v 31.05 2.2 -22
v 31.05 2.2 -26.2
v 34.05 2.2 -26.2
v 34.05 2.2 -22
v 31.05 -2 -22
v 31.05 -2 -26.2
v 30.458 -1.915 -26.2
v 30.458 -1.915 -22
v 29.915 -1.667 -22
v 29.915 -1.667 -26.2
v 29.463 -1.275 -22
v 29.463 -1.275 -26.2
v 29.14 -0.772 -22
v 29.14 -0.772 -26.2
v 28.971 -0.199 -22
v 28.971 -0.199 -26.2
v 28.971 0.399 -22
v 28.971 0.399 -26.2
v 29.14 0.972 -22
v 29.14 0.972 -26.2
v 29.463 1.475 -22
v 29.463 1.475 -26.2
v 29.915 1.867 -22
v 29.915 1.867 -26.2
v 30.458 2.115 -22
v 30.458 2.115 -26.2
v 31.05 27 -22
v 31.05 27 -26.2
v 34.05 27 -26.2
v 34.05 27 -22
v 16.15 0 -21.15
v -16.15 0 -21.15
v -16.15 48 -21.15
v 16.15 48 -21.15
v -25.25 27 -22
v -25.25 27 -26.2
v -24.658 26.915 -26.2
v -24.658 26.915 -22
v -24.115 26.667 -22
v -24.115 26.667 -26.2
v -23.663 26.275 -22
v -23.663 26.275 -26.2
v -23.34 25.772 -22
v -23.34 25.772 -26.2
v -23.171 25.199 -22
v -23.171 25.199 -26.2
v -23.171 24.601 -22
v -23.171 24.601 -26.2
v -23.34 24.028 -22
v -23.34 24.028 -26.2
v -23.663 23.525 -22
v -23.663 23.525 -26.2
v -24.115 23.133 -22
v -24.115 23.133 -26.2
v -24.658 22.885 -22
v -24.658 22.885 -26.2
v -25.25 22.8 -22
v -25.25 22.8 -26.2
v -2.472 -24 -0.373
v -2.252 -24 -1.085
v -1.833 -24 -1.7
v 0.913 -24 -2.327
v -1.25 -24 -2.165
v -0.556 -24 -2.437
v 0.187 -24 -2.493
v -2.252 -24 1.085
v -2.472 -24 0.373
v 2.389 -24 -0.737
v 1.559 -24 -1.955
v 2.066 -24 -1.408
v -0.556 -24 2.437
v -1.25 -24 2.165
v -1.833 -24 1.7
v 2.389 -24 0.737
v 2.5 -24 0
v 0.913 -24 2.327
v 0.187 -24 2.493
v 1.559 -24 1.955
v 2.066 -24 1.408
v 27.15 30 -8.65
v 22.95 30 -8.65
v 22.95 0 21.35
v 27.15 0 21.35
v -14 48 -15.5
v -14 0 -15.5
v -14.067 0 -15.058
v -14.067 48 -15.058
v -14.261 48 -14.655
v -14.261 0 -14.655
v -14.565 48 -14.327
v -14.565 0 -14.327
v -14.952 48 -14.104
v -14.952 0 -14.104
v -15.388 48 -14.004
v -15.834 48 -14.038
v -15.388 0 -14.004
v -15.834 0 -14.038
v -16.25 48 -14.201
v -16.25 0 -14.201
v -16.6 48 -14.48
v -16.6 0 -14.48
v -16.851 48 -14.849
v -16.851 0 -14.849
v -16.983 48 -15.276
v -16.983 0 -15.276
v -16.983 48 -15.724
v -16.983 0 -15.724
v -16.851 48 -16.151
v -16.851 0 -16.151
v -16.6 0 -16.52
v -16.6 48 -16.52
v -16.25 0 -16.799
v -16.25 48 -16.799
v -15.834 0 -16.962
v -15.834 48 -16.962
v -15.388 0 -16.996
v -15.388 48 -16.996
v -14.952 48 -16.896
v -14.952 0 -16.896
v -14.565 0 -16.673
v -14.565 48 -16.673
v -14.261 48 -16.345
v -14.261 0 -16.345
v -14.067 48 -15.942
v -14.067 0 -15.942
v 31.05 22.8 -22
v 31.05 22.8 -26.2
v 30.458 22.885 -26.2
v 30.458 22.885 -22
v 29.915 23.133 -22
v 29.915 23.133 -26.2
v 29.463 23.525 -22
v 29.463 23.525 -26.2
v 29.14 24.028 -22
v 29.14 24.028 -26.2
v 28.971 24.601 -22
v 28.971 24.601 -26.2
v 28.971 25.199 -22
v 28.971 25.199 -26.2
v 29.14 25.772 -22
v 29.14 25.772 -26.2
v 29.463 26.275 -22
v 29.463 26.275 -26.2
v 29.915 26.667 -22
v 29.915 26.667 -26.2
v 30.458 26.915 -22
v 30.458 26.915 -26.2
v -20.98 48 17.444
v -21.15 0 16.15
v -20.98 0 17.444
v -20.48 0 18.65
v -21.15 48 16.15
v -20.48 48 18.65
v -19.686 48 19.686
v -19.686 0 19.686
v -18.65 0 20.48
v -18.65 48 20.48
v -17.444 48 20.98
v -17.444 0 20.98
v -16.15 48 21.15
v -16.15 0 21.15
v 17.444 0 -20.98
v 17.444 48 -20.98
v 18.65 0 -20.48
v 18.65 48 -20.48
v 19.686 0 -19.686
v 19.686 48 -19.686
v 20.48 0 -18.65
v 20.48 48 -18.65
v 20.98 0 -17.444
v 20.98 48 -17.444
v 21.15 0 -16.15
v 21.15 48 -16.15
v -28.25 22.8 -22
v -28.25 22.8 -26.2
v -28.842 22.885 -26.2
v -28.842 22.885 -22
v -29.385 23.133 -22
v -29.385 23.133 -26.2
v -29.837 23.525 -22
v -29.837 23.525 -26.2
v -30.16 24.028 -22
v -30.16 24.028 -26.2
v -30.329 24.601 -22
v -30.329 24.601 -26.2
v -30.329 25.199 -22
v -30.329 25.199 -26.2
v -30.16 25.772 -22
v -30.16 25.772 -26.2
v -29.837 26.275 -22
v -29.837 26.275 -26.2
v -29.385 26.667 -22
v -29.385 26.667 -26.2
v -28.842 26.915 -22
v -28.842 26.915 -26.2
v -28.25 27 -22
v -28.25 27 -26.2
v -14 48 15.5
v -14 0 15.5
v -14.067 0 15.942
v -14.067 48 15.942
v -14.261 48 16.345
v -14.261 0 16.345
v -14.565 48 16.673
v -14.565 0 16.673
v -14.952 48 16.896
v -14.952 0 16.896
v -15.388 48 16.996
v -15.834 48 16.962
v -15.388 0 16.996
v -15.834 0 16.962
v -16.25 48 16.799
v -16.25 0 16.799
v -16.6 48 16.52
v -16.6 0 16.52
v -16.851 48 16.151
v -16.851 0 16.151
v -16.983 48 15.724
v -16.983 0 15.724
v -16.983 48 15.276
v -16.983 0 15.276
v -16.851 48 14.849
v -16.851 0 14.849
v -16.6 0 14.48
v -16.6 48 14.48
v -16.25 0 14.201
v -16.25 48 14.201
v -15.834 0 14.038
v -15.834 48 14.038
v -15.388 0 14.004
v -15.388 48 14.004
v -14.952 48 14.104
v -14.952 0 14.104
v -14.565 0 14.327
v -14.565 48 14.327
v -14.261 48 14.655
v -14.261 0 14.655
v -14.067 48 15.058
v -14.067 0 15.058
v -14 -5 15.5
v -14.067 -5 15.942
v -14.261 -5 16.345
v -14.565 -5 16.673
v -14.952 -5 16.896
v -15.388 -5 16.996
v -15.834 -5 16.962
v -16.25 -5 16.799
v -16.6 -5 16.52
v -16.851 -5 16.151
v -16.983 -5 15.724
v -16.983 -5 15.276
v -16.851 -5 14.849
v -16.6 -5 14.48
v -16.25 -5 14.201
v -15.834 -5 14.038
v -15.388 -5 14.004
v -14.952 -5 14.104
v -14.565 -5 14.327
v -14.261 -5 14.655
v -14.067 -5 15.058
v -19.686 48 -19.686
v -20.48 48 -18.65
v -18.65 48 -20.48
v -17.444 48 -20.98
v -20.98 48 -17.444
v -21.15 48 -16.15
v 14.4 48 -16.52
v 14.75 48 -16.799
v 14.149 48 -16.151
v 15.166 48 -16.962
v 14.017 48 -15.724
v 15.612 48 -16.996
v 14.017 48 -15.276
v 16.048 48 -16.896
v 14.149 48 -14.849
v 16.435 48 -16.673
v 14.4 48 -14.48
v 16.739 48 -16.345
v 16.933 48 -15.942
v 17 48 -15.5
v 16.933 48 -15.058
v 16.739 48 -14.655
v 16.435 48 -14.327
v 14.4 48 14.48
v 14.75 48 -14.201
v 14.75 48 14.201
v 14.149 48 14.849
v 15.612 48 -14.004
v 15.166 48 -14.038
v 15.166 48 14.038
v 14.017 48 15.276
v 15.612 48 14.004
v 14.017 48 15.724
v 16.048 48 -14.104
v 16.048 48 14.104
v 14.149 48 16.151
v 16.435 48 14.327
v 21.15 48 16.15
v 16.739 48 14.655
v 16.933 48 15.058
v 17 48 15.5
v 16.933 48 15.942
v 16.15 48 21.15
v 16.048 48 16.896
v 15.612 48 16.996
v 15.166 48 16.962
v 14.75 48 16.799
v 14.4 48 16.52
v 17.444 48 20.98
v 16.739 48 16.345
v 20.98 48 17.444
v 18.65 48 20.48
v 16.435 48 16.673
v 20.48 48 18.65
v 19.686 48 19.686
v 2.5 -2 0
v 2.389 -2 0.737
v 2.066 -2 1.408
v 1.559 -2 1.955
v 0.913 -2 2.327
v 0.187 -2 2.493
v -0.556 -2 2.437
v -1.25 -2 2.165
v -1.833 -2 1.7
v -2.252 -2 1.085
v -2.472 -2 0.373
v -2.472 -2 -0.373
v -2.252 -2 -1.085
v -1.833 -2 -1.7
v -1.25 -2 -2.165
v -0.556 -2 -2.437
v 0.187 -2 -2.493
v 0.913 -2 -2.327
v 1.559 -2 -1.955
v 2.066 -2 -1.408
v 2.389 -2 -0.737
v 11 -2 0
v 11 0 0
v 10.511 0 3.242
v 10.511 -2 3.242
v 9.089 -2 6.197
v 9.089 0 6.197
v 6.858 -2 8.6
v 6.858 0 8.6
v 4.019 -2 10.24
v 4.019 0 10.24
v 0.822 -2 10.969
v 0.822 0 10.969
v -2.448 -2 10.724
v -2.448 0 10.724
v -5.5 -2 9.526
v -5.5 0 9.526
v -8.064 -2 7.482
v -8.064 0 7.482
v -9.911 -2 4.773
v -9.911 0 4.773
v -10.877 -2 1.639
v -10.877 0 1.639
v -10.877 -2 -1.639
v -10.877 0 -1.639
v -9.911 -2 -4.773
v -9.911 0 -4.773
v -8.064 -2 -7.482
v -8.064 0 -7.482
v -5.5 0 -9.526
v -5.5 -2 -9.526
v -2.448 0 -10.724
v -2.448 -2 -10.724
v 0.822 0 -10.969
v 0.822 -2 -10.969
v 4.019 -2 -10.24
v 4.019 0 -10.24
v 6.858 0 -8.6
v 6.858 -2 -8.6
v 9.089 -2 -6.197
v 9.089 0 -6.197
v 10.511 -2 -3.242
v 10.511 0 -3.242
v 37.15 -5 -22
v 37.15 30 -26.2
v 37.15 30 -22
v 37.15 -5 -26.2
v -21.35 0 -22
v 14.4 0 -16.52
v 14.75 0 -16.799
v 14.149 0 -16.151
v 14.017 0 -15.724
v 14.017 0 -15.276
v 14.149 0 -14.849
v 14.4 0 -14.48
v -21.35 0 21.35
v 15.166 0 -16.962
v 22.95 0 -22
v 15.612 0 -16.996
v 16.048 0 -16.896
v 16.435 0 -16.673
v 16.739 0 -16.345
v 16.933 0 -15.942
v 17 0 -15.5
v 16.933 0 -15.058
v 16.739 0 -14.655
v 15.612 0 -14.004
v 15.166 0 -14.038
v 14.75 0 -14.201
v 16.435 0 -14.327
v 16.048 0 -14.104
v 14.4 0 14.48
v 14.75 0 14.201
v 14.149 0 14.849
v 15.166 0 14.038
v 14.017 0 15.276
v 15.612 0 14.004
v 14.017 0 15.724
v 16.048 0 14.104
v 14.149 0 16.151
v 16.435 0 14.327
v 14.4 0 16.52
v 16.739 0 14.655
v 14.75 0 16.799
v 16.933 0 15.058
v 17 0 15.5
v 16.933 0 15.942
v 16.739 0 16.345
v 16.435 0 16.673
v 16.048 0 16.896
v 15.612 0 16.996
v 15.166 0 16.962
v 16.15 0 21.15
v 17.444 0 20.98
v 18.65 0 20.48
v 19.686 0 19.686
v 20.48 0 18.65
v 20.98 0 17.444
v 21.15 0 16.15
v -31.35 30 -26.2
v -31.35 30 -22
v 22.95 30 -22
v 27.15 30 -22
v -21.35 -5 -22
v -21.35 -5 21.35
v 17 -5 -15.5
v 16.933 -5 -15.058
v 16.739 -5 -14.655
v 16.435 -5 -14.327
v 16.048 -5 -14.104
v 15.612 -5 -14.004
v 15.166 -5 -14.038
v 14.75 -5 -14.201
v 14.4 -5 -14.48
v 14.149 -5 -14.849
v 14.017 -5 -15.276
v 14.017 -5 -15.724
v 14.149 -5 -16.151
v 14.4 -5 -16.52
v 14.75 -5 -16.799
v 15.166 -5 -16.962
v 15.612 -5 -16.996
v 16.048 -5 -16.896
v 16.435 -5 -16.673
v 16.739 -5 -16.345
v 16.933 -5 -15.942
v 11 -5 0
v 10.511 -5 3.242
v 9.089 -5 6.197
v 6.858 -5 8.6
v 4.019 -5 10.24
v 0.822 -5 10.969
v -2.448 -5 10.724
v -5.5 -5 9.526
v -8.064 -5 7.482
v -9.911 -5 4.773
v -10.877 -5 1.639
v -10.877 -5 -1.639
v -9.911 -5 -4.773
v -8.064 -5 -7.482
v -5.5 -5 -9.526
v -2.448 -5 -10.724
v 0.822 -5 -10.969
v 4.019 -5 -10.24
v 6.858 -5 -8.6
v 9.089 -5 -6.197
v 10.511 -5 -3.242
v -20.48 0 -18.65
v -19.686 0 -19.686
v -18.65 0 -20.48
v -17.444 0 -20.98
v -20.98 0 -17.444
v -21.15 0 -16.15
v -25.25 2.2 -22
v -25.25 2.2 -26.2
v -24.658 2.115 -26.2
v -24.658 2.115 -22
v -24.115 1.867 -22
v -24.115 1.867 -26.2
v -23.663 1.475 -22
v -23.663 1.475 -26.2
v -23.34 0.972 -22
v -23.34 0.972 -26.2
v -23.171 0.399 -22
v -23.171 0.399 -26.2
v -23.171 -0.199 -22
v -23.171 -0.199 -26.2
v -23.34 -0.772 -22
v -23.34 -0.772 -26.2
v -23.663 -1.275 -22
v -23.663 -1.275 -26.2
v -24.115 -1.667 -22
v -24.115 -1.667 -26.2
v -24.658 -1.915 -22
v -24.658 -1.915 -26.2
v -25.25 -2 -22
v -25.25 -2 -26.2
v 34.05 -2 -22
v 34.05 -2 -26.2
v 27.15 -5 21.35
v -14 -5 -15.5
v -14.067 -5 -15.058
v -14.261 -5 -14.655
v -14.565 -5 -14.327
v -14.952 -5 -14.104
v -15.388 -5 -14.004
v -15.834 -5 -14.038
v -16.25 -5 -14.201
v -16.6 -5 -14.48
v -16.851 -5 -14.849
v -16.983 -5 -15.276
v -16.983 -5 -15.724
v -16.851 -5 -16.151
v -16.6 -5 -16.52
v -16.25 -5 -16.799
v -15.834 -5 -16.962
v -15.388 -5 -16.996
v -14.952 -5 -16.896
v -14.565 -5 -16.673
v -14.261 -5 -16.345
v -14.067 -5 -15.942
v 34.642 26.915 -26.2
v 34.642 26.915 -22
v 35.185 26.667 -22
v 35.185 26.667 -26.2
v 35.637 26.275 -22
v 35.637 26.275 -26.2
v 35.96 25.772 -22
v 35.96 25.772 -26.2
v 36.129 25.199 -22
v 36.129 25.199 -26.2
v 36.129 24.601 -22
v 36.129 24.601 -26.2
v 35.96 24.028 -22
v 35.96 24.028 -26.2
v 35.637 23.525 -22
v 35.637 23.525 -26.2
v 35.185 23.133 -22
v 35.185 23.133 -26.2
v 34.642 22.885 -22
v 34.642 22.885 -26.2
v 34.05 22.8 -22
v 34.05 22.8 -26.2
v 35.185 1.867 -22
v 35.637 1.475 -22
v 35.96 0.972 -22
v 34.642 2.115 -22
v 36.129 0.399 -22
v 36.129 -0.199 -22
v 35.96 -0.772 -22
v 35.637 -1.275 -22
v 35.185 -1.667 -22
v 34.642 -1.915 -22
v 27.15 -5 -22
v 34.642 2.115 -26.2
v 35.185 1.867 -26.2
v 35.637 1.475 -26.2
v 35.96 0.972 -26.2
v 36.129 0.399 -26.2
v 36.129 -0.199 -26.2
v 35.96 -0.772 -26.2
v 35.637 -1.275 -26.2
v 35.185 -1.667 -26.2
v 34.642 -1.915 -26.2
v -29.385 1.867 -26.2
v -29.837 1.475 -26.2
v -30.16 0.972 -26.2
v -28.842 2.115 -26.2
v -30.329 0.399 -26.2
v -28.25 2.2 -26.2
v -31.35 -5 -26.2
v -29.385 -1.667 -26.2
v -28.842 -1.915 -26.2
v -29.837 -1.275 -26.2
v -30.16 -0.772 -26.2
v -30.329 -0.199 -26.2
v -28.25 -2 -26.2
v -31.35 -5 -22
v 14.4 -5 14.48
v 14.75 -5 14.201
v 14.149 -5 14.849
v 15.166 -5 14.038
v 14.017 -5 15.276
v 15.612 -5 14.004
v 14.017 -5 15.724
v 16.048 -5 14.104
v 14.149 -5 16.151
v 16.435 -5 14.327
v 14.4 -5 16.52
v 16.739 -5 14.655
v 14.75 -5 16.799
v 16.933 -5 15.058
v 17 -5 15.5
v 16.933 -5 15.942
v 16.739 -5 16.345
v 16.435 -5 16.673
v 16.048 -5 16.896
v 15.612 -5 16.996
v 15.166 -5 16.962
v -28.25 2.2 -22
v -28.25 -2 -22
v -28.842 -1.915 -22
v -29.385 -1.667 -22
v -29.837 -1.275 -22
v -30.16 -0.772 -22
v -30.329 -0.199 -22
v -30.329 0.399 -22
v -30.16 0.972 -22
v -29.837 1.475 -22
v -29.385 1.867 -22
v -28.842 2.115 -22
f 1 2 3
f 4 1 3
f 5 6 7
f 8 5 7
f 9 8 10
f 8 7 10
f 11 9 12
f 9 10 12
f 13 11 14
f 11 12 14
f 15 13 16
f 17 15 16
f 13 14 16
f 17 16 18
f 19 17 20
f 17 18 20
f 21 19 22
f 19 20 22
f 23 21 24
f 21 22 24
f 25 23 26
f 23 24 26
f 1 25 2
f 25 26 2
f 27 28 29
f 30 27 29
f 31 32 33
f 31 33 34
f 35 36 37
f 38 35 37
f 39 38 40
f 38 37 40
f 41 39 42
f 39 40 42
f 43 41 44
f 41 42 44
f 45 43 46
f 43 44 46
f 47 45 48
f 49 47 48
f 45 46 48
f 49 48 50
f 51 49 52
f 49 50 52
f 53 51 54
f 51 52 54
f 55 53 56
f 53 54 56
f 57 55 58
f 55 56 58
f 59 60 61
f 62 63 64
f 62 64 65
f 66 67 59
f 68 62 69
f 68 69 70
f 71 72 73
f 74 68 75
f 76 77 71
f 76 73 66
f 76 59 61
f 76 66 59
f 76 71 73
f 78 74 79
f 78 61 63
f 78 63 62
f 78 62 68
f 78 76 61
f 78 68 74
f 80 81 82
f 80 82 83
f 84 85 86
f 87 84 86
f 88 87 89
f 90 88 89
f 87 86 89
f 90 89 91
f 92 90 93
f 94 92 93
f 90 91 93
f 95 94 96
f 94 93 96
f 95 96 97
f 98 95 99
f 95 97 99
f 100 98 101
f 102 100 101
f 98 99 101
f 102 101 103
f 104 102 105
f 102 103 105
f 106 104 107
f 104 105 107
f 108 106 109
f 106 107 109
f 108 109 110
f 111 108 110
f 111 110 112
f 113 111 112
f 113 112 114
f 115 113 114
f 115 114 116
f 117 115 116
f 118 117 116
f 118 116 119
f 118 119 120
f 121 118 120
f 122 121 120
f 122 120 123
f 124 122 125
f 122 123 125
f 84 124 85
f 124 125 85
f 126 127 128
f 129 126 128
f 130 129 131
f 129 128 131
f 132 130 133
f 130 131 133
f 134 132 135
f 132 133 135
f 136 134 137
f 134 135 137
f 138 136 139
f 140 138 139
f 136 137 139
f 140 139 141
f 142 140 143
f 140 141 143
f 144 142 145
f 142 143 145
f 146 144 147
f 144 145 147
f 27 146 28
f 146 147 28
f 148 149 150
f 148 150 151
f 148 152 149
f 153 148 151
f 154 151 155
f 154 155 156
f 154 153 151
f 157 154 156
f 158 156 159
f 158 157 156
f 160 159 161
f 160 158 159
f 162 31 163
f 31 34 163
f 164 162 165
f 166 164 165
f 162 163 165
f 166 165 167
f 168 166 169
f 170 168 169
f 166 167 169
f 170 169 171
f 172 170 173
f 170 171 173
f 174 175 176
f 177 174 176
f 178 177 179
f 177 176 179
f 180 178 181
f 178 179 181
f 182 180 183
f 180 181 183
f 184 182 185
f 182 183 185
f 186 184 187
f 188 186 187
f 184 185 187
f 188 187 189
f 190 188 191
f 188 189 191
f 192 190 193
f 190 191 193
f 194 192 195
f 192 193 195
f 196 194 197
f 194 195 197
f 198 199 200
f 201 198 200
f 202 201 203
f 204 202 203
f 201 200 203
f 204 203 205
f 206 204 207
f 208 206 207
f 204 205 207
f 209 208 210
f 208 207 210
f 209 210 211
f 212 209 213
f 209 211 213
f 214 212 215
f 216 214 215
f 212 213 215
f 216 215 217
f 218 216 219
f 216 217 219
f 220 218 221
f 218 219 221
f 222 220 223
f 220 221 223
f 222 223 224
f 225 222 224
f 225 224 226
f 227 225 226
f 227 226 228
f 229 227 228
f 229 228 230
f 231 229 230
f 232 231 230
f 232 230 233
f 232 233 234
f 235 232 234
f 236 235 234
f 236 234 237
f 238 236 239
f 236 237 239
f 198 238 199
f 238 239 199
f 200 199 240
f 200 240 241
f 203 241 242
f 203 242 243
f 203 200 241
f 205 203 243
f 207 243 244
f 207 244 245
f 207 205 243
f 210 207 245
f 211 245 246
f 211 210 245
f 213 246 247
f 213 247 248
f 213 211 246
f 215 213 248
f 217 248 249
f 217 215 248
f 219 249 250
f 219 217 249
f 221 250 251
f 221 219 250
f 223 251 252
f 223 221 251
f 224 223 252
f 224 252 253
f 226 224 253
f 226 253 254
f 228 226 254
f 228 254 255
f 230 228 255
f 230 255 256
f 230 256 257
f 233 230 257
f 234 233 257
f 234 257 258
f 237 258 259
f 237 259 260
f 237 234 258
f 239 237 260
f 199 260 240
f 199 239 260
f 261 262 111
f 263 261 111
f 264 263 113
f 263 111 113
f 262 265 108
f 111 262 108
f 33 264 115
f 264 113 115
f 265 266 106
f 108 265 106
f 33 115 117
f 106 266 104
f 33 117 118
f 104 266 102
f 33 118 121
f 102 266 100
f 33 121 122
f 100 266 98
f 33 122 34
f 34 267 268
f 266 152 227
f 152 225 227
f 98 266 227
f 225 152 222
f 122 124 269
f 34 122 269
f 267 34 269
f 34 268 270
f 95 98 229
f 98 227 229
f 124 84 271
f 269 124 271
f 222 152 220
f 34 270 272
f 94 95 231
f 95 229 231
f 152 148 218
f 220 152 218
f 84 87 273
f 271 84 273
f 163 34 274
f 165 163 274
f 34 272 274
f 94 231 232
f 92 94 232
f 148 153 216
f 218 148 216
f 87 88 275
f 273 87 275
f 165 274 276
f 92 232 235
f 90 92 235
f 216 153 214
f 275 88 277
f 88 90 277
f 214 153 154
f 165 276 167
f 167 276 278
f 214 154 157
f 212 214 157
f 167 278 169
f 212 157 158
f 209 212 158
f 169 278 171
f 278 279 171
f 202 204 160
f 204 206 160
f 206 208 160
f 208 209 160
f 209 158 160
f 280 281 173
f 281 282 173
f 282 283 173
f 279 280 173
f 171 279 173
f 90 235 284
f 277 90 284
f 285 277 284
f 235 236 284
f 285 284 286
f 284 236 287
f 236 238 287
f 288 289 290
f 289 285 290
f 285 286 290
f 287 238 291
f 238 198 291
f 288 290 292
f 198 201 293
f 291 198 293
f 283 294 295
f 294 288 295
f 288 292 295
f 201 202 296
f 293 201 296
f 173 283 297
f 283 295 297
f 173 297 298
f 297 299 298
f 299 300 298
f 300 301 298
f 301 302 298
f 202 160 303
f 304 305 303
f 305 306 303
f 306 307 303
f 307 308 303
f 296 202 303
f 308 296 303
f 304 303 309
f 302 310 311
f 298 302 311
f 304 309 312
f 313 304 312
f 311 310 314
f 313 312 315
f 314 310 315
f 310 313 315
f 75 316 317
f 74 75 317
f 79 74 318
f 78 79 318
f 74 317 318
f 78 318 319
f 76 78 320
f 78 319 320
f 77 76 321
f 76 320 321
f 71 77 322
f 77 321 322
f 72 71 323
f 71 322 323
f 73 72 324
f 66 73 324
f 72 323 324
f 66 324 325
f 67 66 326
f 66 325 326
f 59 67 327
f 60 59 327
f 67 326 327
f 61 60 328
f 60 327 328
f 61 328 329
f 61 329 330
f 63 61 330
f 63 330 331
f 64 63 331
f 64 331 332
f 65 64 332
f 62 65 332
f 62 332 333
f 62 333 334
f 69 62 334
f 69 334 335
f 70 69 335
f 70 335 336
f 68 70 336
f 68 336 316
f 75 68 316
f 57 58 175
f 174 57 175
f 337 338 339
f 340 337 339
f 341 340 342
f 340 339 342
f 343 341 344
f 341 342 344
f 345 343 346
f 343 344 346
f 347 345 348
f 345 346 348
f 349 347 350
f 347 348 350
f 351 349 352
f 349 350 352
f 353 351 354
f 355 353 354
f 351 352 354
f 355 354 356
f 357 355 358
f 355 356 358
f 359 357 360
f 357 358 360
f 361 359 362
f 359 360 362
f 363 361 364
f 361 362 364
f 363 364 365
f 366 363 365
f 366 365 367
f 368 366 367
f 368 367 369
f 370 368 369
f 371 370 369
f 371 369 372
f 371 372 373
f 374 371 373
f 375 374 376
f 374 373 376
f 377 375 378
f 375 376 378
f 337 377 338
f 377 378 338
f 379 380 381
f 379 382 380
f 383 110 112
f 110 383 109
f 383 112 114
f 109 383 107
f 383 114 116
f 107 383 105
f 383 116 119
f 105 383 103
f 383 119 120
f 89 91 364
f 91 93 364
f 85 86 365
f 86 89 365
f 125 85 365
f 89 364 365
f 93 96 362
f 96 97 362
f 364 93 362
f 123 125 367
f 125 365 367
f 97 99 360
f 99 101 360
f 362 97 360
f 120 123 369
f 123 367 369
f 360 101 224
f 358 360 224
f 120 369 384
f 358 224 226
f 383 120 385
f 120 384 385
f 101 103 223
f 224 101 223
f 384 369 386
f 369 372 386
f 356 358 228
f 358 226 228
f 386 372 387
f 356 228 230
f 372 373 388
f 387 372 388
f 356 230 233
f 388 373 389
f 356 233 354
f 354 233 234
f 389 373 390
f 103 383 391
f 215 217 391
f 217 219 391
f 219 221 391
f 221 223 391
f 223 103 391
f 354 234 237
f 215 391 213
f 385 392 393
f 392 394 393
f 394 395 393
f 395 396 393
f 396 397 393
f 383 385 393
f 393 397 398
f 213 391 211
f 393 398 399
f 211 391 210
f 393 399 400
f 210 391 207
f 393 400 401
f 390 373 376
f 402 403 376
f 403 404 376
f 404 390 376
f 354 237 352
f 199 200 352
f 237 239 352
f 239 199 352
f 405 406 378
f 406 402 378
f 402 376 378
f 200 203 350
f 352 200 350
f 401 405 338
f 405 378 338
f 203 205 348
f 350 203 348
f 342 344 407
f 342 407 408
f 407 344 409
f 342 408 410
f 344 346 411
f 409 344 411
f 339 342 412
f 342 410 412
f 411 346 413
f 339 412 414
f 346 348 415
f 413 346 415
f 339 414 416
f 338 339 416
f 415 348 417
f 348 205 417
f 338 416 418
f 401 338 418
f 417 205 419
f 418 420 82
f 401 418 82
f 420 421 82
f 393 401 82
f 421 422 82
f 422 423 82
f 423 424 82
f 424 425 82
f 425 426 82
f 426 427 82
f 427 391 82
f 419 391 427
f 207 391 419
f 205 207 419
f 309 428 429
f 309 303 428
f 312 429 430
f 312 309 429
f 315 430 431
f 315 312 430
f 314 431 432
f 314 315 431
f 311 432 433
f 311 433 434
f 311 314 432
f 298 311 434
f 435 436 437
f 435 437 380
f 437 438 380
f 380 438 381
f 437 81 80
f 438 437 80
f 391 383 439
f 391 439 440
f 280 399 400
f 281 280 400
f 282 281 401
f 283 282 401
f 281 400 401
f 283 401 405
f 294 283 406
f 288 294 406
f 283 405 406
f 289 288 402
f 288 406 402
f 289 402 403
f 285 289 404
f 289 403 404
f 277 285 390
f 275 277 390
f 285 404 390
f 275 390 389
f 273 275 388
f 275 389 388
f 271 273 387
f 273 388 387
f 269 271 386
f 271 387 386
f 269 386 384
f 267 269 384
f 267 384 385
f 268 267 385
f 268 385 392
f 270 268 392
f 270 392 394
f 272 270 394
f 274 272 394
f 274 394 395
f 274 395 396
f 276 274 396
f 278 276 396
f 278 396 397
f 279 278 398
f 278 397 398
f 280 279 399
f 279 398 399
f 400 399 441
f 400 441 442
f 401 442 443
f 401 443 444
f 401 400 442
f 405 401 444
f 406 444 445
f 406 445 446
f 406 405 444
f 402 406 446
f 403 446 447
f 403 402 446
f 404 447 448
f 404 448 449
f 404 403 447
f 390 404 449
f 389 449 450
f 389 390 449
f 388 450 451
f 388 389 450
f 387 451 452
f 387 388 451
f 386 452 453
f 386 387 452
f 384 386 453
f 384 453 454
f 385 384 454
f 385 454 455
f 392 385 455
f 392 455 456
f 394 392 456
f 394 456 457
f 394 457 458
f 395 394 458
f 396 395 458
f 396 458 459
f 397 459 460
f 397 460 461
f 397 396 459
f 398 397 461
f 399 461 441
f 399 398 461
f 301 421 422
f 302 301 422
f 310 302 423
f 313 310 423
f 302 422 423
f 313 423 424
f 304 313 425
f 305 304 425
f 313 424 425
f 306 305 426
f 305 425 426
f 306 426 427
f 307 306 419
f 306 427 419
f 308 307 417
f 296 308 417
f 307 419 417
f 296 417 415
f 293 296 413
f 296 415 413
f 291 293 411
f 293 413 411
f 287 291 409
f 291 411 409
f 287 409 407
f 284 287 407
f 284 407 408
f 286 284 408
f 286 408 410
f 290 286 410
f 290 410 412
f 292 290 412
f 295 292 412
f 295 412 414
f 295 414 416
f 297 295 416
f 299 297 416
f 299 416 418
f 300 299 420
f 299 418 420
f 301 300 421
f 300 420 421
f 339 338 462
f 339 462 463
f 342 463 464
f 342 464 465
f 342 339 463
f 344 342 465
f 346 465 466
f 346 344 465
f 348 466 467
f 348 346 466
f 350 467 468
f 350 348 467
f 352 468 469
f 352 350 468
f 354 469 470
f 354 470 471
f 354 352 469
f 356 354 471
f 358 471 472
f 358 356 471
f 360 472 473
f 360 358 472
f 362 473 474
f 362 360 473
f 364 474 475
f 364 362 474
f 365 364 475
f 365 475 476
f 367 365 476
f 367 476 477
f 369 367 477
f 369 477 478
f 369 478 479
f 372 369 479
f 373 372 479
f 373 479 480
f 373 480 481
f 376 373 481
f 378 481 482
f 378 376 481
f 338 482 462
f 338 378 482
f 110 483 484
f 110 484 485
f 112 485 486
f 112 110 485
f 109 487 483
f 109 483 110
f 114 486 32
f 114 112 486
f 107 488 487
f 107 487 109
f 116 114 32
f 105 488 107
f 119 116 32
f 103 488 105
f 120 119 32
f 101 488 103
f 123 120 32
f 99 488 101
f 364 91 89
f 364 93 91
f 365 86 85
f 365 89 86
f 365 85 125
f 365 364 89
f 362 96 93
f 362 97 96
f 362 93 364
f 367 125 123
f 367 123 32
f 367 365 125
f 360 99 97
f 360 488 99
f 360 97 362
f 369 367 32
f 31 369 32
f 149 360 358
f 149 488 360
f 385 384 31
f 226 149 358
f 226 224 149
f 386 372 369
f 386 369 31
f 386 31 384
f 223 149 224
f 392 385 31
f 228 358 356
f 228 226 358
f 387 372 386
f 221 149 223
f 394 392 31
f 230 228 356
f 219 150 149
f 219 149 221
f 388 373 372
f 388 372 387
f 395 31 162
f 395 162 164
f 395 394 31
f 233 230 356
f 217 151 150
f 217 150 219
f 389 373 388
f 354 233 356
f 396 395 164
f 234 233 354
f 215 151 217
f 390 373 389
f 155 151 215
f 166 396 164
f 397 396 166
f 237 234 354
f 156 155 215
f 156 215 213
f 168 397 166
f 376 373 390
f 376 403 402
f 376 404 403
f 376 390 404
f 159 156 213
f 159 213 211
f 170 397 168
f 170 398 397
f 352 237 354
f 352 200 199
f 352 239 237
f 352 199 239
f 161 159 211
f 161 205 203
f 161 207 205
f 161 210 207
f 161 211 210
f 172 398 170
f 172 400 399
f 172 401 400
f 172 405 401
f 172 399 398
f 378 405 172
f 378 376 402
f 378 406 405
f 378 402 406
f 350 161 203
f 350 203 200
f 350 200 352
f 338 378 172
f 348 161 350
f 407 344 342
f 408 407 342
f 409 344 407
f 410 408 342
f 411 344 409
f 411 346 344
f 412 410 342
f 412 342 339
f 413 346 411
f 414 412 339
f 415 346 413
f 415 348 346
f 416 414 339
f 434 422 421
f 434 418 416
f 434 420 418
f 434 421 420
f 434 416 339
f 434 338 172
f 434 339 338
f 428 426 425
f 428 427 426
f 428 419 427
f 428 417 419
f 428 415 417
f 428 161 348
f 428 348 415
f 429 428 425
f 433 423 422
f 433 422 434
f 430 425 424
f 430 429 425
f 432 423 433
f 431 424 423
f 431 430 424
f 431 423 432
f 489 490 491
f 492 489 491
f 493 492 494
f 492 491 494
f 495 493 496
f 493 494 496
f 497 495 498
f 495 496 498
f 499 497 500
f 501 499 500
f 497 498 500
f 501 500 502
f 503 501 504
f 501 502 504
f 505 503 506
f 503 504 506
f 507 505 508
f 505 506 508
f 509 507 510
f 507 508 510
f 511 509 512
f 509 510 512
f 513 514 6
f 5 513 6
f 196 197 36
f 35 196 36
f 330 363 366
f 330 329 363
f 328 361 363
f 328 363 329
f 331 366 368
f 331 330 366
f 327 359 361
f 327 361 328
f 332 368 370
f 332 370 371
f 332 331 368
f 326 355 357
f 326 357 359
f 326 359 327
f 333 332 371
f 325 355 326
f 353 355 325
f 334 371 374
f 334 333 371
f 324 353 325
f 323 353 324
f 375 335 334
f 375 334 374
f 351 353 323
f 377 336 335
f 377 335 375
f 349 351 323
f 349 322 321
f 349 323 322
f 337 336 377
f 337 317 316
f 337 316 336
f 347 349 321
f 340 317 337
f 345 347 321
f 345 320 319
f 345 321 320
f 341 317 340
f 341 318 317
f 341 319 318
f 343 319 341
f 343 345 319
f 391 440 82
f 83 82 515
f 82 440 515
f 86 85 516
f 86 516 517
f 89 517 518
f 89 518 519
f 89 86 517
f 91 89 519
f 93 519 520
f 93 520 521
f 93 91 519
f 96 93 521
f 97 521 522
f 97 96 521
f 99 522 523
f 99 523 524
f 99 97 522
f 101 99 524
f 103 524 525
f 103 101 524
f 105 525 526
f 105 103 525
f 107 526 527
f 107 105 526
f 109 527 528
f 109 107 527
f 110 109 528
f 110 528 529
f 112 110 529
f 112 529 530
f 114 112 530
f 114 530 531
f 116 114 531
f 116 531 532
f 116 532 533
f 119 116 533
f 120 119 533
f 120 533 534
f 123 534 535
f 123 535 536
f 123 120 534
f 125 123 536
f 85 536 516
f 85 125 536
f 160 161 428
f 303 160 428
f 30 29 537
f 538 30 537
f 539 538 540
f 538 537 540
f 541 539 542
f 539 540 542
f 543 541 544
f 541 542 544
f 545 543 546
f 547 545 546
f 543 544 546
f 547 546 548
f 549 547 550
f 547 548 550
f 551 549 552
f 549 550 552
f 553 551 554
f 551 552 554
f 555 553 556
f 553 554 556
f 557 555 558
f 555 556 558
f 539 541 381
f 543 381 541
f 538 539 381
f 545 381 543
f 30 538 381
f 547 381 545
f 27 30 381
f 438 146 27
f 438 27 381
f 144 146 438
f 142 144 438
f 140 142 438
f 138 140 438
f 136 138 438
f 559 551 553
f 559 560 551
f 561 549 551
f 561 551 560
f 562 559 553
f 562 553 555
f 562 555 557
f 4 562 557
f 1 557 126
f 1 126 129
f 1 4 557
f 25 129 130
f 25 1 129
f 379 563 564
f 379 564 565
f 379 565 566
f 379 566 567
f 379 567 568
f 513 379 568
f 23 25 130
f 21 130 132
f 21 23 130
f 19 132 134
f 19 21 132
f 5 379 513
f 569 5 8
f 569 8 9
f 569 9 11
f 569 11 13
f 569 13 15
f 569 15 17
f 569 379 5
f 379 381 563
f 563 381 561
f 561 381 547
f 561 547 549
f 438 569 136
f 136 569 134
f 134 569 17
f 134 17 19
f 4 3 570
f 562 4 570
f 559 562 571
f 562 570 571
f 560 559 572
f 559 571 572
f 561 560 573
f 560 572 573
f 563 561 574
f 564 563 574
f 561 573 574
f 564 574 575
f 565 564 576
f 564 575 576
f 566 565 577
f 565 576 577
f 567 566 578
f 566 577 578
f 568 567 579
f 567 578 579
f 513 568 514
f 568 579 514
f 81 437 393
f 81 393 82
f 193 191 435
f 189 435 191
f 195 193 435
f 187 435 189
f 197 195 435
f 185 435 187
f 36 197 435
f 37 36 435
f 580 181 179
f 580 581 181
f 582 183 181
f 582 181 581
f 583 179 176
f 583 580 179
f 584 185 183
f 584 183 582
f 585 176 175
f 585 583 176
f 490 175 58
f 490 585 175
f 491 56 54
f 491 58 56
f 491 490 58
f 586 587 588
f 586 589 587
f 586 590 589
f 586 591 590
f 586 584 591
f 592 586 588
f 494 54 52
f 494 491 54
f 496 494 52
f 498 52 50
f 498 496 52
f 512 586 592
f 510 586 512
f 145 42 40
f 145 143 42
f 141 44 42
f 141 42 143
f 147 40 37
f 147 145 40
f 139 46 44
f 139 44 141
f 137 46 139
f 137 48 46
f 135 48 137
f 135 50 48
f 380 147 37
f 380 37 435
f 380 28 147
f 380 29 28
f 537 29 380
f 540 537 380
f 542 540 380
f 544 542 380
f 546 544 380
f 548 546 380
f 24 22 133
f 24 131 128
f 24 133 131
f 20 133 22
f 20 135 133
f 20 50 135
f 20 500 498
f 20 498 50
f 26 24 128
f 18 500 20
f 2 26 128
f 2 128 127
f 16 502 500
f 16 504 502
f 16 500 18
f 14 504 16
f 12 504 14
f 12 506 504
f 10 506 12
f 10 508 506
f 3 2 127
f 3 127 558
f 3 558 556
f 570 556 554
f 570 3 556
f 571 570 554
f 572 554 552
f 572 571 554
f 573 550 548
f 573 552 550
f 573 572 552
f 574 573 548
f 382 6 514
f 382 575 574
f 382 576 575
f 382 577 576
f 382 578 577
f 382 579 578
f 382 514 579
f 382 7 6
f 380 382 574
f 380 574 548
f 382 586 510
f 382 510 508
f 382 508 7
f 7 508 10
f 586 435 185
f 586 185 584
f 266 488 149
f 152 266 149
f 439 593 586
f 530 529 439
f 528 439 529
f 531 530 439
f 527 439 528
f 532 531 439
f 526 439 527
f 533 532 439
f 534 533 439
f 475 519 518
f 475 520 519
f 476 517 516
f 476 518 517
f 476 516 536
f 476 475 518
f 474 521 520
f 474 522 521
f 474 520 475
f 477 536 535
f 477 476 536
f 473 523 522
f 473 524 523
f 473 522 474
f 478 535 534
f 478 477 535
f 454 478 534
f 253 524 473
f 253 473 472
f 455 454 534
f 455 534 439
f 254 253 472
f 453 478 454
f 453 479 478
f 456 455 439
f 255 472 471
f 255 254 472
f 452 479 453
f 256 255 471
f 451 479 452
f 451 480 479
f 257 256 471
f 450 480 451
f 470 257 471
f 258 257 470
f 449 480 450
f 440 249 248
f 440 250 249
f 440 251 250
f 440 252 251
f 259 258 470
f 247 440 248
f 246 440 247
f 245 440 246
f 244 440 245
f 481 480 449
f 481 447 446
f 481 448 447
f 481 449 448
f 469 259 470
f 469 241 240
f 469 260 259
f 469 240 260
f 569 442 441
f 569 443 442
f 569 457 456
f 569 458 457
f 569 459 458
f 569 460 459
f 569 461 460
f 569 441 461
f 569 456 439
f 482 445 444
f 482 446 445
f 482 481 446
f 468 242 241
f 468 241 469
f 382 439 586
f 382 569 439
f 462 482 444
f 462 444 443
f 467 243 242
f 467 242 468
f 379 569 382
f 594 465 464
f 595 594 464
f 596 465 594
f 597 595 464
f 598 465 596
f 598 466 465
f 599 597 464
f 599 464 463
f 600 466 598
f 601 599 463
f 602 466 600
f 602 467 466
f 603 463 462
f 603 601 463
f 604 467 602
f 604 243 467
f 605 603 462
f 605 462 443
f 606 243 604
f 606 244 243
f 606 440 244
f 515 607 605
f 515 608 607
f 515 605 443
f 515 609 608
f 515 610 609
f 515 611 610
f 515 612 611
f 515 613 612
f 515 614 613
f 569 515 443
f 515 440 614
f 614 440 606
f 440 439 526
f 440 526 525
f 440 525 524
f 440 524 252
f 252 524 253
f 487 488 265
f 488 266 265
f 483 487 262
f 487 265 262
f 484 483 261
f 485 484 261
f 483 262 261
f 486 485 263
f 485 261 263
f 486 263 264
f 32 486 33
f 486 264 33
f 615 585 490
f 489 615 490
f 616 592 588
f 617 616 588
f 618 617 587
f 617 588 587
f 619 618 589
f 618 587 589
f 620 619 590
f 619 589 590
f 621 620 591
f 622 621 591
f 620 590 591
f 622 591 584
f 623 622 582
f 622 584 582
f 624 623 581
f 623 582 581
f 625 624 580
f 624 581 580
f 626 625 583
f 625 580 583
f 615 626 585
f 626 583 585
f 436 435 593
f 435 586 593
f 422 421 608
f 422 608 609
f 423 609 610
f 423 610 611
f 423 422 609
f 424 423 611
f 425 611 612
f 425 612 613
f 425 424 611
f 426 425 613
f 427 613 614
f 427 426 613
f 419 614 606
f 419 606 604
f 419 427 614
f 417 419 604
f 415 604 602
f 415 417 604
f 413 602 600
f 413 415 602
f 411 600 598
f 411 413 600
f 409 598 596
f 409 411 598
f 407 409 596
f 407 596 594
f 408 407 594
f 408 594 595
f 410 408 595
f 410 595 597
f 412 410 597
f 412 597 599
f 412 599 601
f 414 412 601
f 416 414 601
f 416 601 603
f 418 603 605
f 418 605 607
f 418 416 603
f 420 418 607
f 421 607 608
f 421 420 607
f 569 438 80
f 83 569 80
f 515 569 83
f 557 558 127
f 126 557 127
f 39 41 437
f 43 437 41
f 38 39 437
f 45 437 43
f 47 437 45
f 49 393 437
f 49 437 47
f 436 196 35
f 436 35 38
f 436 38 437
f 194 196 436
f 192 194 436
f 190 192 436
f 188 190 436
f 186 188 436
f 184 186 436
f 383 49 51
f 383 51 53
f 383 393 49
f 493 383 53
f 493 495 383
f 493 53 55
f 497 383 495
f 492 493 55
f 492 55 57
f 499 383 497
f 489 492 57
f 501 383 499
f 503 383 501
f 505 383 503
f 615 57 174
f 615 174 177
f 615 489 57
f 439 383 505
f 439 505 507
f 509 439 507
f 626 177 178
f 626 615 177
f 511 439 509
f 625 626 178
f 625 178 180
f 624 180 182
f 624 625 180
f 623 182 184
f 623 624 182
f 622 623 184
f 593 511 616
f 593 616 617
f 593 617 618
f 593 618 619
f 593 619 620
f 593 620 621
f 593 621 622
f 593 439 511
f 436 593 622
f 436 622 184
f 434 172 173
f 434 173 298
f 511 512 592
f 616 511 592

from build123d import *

# Parameters (mm, degrees)
F0_R      = 2.5
F1_DEPTH  = 24
F0_R_2    = 11
F2_DEPTH  = 2
F0_W      = 42.3
F0_H      = 42.3
F0_R_3    = 1.5
F3_DEPTH  = 48
F4_R      = 5
F5_W      = 4.2
F5_H      = 43.35
F5_W_2    = 10
F5_H_2    = 4.2
F5_W_3    = 44.3
F5_R      = 1.5
F5_R_2    = 11
F6_DEPTH  = 5
F7_DEPTH  = 30
F8_SIZE   = 30
F10_DEPTH = 47.551


with BuildPart() as f1:
    # F0 (on Front) → F1 (new body)
    with BuildSketch(Plane.XZ):
        Circle(F0_R)
    extrude(amount=F1_DEPTH)

    # F0 (on Front) → F2 (join)
    with BuildSketch(Plane.XZ):
        Circle(F0_R_2)
        Circle(F0_R, mode=Mode.SUBTRACT)
    extrude(amount=F2_DEPTH)

    # F0 (on Front) → F3 (join)
    with BuildSketch(Plane.XZ):
        Rectangle(F0_W, F0_H)
        with Locations((-15.5, -15.5)):
            Circle(F0_R_3, mode=Mode.SUBTRACT)
        with Locations((15.5, -15.5)):
            Circle(F0_R_3, mode=Mode.SUBTRACT)
        with Locations((-15.5, 15.5)):
            Circle(F0_R_3, mode=Mode.SUBTRACT)
        Circle(F0_R_2, mode=Mode.SUBTRACT)
        with Locations((15.5, 15.5)):
            Circle(F0_R_3, mode=Mode.SUBTRACT)
        Circle(F0_R_2)
        Circle(F0_R, mode=Mode.SUBTRACT)
        Circle(F0_R)
    extrude(amount=-F3_DEPTH)

    # F4
    f4_edges = [f1.edges().sort_by_distance(p)[0] for p in [
        (21.15, 24, 21.15),
        (21.15, 24, -21.15),
        (-21.15, 24, -21.15),
        (-21.15, 24, 21.15),
    ]]
    fillet(f4_edges, radius=F4_R)


with BuildPart() as f6:
    # F5 (on face) → F6 (new body)
    with BuildSketch(Plane.XZ):
        with Locations((25.05, -0.325)):
            Rectangle(F5_W, F5_H)
        Polygon((22.95, -22), (-21.35, -22), (-21.35, -26.2), (27.15, -26.2), (27.15, -22), align=None)
        with Locations((32.15, -24.1)):
            Rectangle(F5_W_2, F5_H_2)
        with Locations((-26.35, -24.1)):
            Rectangle(F5_W_2, F5_H_2)
        with Locations((0.8, -0.325)):
            Rectangle(F5_W_3, F5_H)
        with BuildLine():
            Line((21.15, 16.15), (21.15, -16.15))
            ThreePointArc((21.15, -16.15), (19.6855339059, -19.6855339059), (16.15, -21.15))
            Line((16.15, -21.15), (-16.15, -21.15))
            ThreePointArc((-16.15, -21.15), (-19.6855339059, -19.6855339059), (-21.15, -16.15))
            Line((-21.15, -16.15), (-21.15, 16.15))
            ThreePointArc((-21.15, 16.15), (-19.6855339059, 19.6855339059), (-16.15, 21.15))
            Line((-16.15, 21.15), (16.15, 21.15))
            ThreePointArc((16.15, 21.15), (19.6855339059, 19.6855339059), (21.15, 16.15))
        make_face(mode=Mode.SUBTRACT)
        with BuildLine():
            ThreePointArc((16.15, -21.15), (19.6855339059, -19.6855339059), (21.15, -16.15))
            Line((21.15, -16.15), (21.15, 16.15))
            ThreePointArc((21.15, 16.15), (19.6855339059, 19.6855339059), (16.15, 21.15))
            Line((16.15, 21.15), (-16.15, 21.15))
            ThreePointArc((-16.15, 21.15), (-19.6855339059, 19.6855339059), (-21.15, 16.15))
            Line((-21.15, 16.15), (-21.15, -16.15))
            ThreePointArc((-21.15, -16.15), (-19.6855339059, -19.6855339059), (-16.15, -21.15))
            Line((-16.15, -21.15), (16.15, -21.15))
        make_face()
        with Locations((-15.5, -15.5)):
            Circle(F5_R, mode=Mode.SUBTRACT)
        with Locations((15.5, -15.5)):
            Circle(F5_R, mode=Mode.SUBTRACT)
        Circle(F5_R_2, mode=Mode.SUBTRACT)
        with Locations((-15.5, 15.5)):
            Circle(F5_R, mode=Mode.SUBTRACT)
        with Locations((15.5, 15.5)):
            Circle(F5_R, mode=Mode.SUBTRACT)
    extrude(amount=F6_DEPTH)

    # F5 (on face) → F7 (join)
    with BuildSketch(Plane.XZ):
        Polygon((22.95, -22), (-21.35, -22), (-21.35, -26.2), (27.15, -26.2), (27.15, -22), align=None)
        with Locations((32.15, -24.1)):
            Rectangle(F5_W_2, F5_H_2)
        with Locations((25.05, -0.325)):
            Rectangle(F5_W, F5_H)
        with Locations((-26.35, -24.1)):
            Rectangle(F5_W_2, F5_H_2)
    extrude(amount=-F7_DEPTH)

    # F8
    f8_edges = [f6.edges().sort_by_distance(p)[0] for p in [
        (25.05, 30, 21.35),
    ]]
    chamfer(f8_edges, length=F8_SIZE)

    # F9 (on face) → F10 (cut, through all)
    with BuildSketch(Plane(origin=(0, 0, -26.2), x_dir=(1, 0, 0), z_dir=(0, 0, -1))):
        with BuildLine():
            ThreePointArc((31.05, -22.8), (28.95, -24.9), (31.05, -27))
            Line((31.05, -27), (34.05, -27))
            ThreePointArc((34.05, -27), (36.15, -24.9), (34.05, -22.8))
            Line((34.05, -22.8), (31.05, -22.8))
        make_face()
        with BuildLine():
            Line((34.05, 2), (31.05, 2))
            ThreePointArc((31.05, 2), (28.95, -0.1), (31.05, -2.2))
            Line((31.05, -2.2), (34.05, -2.2))
            ThreePointArc((34.05, -2.2), (36.15, -0.1), (34.05, 2))
        make_face()
        with BuildLine():
            Line((-28.25, -27), (-25.25, -27))
            ThreePointArc((-25.25, -27), (-23.15, -24.9), (-25.25, -22.8))
            Line((-25.25, -22.8), (-28.25, -22.8))
            ThreePointArc((-28.25, -22.8), (-30.35, -24.9), (-28.25, -27))
        make_face()
        with BuildLine():
            ThreePointArc((-28.25, 2), (-30.35, -0.1), (-28.25, -2.2))
            Line((-28.25, -2.2), (-25.25, -2.2))
            ThreePointArc((-25.25, -2.2), (-23.15, -0.1), (-25.25, 2))
            Line((-25.25, 2), (-28.25, 2))
        make_face()
    extrude(amount=-F10_DEPTH, mode=Mode.SUBTRACT)


solid = Compound([f1.part, f6.part])
